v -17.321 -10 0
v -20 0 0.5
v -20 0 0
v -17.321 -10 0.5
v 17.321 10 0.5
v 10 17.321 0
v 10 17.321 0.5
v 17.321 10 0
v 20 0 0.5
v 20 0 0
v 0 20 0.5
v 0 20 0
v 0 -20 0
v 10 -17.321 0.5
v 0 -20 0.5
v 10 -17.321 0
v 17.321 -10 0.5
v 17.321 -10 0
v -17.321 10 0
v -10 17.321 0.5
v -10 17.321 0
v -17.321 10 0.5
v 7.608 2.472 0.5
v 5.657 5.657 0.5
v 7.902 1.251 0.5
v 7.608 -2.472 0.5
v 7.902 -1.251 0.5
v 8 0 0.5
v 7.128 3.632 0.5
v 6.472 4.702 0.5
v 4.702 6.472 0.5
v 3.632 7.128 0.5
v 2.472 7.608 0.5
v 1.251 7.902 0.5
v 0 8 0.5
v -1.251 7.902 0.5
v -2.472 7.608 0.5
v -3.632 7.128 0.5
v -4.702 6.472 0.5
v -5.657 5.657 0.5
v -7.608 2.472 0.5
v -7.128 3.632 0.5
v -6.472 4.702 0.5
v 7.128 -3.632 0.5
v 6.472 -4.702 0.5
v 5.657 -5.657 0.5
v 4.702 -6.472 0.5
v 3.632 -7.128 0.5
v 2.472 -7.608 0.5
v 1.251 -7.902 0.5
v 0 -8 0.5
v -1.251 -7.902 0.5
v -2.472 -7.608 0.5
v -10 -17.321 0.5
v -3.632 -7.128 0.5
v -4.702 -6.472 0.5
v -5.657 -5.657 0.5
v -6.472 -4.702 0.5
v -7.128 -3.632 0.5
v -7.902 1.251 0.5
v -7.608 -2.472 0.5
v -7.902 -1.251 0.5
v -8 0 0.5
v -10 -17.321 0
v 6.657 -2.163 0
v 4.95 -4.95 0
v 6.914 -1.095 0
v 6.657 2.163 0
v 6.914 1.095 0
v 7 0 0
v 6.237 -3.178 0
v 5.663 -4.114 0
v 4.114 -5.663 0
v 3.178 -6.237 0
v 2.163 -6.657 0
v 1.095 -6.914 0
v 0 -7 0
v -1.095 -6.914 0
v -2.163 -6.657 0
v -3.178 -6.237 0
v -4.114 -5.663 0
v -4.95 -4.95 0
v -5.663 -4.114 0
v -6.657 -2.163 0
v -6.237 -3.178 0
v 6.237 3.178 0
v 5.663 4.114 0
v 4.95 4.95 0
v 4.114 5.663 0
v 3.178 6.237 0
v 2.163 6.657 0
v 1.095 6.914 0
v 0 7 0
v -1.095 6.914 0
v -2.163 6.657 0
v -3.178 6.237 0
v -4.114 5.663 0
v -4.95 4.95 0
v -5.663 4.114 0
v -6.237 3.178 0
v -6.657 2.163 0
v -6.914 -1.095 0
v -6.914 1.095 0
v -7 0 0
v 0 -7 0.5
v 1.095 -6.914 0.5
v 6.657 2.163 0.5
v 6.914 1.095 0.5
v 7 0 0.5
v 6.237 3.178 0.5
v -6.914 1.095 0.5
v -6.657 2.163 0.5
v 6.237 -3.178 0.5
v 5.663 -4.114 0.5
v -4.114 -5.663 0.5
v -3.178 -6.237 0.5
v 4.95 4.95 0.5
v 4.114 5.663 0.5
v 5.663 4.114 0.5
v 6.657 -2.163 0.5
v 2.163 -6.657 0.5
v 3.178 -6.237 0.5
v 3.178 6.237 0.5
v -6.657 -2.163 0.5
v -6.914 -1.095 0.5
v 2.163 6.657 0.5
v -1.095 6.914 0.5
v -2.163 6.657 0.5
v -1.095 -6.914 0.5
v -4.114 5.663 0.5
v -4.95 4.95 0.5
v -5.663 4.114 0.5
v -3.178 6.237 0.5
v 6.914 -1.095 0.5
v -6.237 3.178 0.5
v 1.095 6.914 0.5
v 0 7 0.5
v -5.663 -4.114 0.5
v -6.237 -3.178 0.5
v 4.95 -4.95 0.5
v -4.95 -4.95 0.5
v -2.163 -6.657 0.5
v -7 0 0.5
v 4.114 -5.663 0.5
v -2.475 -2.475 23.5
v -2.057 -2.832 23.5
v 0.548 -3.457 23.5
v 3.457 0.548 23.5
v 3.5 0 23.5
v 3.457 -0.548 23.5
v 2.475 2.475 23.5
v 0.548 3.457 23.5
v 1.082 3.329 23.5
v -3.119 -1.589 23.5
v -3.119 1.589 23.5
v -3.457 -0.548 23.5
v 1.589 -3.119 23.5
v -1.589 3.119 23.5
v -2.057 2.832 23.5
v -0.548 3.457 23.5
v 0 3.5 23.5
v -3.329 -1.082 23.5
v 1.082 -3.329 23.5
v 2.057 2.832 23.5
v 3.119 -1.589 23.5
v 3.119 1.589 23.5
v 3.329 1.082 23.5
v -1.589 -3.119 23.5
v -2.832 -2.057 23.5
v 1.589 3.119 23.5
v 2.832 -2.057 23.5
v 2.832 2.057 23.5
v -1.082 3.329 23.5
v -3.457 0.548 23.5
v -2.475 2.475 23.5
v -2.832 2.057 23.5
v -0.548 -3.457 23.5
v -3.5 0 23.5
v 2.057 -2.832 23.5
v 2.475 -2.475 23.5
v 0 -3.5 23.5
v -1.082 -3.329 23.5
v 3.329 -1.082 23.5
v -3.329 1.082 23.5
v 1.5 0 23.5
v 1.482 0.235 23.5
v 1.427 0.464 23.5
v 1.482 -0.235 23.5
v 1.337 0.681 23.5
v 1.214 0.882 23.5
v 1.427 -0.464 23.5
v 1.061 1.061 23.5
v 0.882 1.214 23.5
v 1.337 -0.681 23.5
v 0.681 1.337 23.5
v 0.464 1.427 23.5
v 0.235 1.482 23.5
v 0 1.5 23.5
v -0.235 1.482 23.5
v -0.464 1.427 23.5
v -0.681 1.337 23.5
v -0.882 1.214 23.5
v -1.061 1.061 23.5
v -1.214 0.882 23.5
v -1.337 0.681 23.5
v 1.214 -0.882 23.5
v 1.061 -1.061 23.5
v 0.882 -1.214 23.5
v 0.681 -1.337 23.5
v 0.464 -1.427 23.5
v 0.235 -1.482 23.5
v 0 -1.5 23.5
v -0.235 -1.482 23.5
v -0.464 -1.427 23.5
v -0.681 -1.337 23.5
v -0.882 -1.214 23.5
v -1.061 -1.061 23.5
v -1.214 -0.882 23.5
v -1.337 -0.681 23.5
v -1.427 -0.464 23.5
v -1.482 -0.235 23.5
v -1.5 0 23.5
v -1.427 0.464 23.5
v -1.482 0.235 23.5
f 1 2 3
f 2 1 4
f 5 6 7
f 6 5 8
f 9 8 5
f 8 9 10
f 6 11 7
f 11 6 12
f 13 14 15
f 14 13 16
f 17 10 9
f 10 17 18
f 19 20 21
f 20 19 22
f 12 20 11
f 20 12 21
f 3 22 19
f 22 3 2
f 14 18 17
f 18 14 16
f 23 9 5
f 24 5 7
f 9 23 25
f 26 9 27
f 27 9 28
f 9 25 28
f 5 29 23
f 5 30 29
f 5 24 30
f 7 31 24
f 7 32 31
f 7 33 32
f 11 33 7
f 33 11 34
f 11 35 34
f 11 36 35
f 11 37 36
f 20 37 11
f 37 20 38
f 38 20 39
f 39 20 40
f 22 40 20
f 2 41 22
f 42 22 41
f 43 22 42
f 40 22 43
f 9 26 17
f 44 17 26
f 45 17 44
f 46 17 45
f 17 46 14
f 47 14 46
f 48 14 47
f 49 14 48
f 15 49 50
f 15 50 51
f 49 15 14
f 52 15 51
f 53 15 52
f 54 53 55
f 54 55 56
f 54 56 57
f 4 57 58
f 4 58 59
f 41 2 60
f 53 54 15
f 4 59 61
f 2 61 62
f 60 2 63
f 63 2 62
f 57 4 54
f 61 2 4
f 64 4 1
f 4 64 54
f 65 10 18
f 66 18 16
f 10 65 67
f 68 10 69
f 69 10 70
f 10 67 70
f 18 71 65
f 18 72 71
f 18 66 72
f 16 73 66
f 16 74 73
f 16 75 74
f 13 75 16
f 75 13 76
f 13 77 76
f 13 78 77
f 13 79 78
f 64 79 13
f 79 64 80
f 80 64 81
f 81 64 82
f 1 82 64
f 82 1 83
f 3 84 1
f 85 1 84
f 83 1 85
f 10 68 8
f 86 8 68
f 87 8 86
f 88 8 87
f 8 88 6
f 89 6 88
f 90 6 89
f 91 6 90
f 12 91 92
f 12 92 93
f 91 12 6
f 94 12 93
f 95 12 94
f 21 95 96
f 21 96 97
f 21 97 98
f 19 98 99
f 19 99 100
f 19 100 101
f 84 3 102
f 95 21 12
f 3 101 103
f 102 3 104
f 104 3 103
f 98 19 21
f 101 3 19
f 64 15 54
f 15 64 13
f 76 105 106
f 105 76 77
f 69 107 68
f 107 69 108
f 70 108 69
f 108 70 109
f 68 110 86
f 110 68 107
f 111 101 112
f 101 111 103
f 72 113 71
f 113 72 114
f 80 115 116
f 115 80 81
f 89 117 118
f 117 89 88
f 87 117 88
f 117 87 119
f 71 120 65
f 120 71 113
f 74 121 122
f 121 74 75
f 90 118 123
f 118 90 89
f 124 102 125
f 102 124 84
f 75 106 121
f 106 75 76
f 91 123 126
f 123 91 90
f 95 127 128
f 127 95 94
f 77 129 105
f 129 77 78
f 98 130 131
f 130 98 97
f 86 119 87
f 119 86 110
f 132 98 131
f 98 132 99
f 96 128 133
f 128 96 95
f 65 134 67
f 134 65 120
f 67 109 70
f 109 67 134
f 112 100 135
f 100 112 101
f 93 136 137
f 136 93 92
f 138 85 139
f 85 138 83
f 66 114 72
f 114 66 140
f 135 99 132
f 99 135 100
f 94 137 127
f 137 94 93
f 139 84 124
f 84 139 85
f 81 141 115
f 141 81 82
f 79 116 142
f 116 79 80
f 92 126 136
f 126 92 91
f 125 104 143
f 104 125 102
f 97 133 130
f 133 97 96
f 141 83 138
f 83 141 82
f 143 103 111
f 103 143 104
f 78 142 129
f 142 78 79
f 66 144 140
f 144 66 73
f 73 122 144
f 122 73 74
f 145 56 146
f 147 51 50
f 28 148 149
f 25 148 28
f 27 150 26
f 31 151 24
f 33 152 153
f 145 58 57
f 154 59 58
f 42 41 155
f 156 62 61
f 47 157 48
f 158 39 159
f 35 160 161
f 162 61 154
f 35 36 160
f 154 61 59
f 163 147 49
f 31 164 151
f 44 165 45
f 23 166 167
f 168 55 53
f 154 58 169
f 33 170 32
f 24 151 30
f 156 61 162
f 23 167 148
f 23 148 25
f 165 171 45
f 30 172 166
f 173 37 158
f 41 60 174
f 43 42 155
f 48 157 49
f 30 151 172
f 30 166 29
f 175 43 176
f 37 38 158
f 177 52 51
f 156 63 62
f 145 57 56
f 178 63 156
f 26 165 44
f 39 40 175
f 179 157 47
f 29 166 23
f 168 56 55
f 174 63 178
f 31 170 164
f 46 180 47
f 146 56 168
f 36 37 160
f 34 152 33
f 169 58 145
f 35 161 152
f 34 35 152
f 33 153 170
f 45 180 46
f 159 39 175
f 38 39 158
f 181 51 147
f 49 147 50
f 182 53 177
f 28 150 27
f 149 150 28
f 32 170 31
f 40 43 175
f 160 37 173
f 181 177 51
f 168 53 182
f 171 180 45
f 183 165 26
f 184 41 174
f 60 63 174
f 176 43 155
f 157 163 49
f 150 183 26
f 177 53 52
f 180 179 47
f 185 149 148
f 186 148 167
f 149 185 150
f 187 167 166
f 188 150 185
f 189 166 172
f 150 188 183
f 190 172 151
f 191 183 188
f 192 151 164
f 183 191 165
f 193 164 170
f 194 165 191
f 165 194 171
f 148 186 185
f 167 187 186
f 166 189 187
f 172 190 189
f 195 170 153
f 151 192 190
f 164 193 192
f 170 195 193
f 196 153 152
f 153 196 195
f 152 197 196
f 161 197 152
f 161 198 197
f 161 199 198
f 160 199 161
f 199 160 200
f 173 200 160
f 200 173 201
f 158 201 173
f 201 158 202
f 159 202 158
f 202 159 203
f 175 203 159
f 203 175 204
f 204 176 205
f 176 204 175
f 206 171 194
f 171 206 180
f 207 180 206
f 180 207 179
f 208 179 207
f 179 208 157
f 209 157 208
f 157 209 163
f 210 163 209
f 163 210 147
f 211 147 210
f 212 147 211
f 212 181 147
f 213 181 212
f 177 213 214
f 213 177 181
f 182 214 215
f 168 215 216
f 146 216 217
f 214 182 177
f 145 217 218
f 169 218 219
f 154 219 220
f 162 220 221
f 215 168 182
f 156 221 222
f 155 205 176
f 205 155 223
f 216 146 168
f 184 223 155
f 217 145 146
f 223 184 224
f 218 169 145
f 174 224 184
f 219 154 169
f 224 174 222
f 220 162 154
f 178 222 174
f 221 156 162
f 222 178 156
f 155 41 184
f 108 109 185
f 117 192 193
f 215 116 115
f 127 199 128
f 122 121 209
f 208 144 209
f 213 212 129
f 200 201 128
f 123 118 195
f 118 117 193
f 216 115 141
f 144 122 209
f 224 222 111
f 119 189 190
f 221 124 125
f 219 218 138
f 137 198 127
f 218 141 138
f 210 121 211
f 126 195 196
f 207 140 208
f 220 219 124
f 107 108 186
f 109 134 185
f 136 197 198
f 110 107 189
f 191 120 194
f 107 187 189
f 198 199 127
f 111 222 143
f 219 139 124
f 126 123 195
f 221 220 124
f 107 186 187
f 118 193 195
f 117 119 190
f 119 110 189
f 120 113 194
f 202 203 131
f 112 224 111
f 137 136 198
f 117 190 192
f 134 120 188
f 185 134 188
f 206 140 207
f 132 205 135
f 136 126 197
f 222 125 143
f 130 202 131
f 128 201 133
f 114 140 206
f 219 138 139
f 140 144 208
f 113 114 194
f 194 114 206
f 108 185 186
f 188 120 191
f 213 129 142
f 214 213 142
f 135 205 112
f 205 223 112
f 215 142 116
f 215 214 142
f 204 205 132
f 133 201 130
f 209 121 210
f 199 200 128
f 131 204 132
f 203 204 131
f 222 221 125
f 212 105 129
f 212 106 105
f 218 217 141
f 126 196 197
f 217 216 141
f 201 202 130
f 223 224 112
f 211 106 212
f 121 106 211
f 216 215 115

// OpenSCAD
$fn = 100;

//Main parameters to tune : Configured for MatterControl
$Rail6mmDiameter = 6.2;//Hole for X 6mm rail attachments to Y carriages and Y rails to base supports - Good
$LeadScrewAttachHoleDiameter = 16.3;//Leadscrew block hole for T-threads
$VerticalLockClearance = .4;//Delta between vertical threaded hole and free hole
$HorizontalLockClearance = .35;//Delta between horizontal threaded hole and free hole
$LockScrewBoreM2_5Vertical = 2.4;//3D printed vertical hole for M2.5 threadlock - Good
$LockScrewBoreM2_5Horizontal = 2.3;//3D printed horizontal hole for M2.5 threadlock
$LockScrewBoreM3Vertical = 3.0;
$LockScrewBoreM3_5Vertical = 3.4;
$LockScrewBoreM3Horizontal = 2.85;
$LockScrewBoreM8Vertical = 7.8;//Vertical M8 threadlocked hole - Good
$Shaft3mmHorizontal = 3.05;
$Bearing8mmDiameter = 22.2;
$LockScrewBoreM2_5Laser = 2.2;//Laser mounting holes for leadscrew block and limit switches
$LockScrewBoreM3Laser = 2.7;
$LockScrewBoreM2Laser = 1.7;//Laser hole size for M2 thread locking
$Bearing6mmDiameter = 12.2;
$XMotorMountSpacing = 11.5;
$BearingShaftDiameter = 8.1;
$XMotorMountExtension = 4; // Extend the X motor Y plate mounting hole lengths to accomodate different motors

$HeightAdjust = 19;//Allow adjustment for overall carriage height for 808T focus requierments. 19 is good since it aligns with original y plate holes to allow dual fitting
$DoTall = 0;

$PlateClearance = .15;

$AcrylicThickness = 3.0;
$BaseAcrylicThickness = 10;
$AlignmentAcrylicThickness = 1.5;


$BaseAcrylicColor = [0.1, 0.5, 0.0, 0.9];
$FrameAcrylicColor = [0.7, 0.8, 0.2, 0.9];
$AlignmentAcrylicColor = [0.3, 0.7, 0.7, 0.4];
$BaseAcrylicColor = [0.1, 0.1, 0.5, 0.6];

$YPosition = 130;
$XPosition = 150;

$RoundToHex = 1.155;

$XRailSpacing = 300;
$CarrierSpacing = 40;
$CarrierZOffset = 14;
$LaserCarrierWidth = 58;
$LaserCarrierLength = 68;
$XRailLength = 300;
$YRailLength = 270;

module RodClamp()
{
  //width = width of main block
  //height = height of main block
  //depth = depth of main block
  //boreheight = height of center of shaft from base
  //boreradius = radius of bore
  //gapwidth = width of clamp gap
  //screwbore = bore hole radius for clamp screw
  //screwstyle = 0-hex side aligned, 1-hex top aligned, 2-round
  //captivestyle = 0-hex side aligned, 1-hex top aligned, 2-square open to top, 3-hex base open top
  //captivebore = bore hole radius of captive nut
  //captivedepth = thicknes of captuve nut
  //screwoffset = height of clamp screw hole delta from centered

  upper = (height - boreheight - boreradius);

//    screwoffset = (upper / 2) + boreradius;
    screwheight = (upper / 2) + boreradius + screwoffset;

  difference()
  {
    translate([-width/2, -depth/2, -boreheight])
      cube([width, depth, height]);
    rotate(90, [1, 0, 0])
      cylinder(r = boreradius, h = depth + 0.1, center = true);
    translate([0, -(depth + 0.1) / 2, 0])
      rotate(-45, [0, 1, 0])
      cube([boreradius, depth + 0.1, boreradius]);
    translate([-gapwidth / 2, -(depth + 0.1) / 2, 0])
    cube([gapwidth, depth + 0.1, height - boreheight + 0.1]);

    translate([0, 0, screwheight])
    {
      rotate(90, [0, 1, 0])
        if (screwstyle == 0)
          cylinder(r = screwbore, h = width + 0.1, center = true, $fn = 6);
        else if (screwstyle == 1)
          rotate(30, [0, 0, 1])
          cylinder(r = screwbore / 0.866025, h = width + 0.1, center = true, $fn = 6);
        else if (screwstyle == 2)
          cylinder(r = screwbore / 0.866025, h = width + 0.1, center = true);
      translate([((width - captivedepth) / 2) + 0.1, 0, 0])
      {
      if (captivestyle == 0)
        rotate(90, [0, 1, 0])
          cylinder(r = captivebore / 0.866025, h = captivedepth + 0.1, center = true, $fn = 6);
      else if (captivestyle == 1)
        rotate(90, [0, 1, 0])
          rotate(30, [0, 0, 1])
            cylinder(r = captivebore / 0.866025, h = captivedepth + 0.1, center = true, $fn = 6);
      else if (captivestyle == 2)
        translate([0, 0, ((upper + (captivebore * 2)) / 4) - ((captivebore * 2)/ 1.8)])
        cube([captivedepth + 0.1, captivebore * 2, ((upper + (captivebore * 2)) / 1.8)], center = true);
      else if (captivestyle == 3)
      {
        translate([0, 0, ((upper + captivebore) / 4)])
        cube([captivedepth + 0.1, captivebore * 2, ((upper + captivebore) / 1.7)], center = true);
        rotate(90, [0, 1, 0])
          cylinder(r = captivebore / 0.866025, h = captivedepth + 0.1, center = true, $fn = 6);
      }
      }
    }
  }
}

module LaserCarrier()
{
  translate([-31, -38.5, -7])
  difference()
  {
    //Base mount
    cube([$LaserCarrierWidth, $LaserCarrierLength, 21]);
    //Mechanism opening
    translate([4, 4, -0.1])
      cube([$LaserCarrierWidth - 8, 68 - 8, 21.2]);
//    //FPC opening, horizontal
//    translate([-1, 23.5, -0.1])
//      cube([20, 30, 5]);
    //Rail support 1
    translate([-0.1, 11, 3])
      rotate(90, [0, 1, 0])
        rotate(30, [0, 0, 1])
          cylinder(d = $Shaft3mmHorizontal * $RoundToHex, h = 70, $fn = 6);
    //Rail support 2
    translate([-0.1, 11 + 48, 3])
      rotate(90, [0, 1, 0])
        rotate(30, [0, 0, 1])
          cylinder(d = $Shaft3mmHorizontal * $RoundToHex, h = 70, $fn = 6);
  }
}

module SideRailClamp()
{
  difference()
  {
	translate([0, 0, ($HeightAdjust * $DoTall)])
    rotate(90, [0, 0, 1])
      RodClamp(width = 15, height = 21 + ($HeightAdjust * $DoTall), screwoffset = 0, depth = 18, boreheight = 6 + ($HeightAdjust * $DoTall), boreradius = ($Rail6mmDiameter / 2), gapwidth = 0, screwbore = 0, screwstyle = 0, captivestyle = 0, captivebore = 0, captivedepth = 0);
	translate([0, 0, ($HeightAdjust * $DoTall)])
	{
    //Rail clamp hole
    translate([0, 10, 0])
      rotate(90, [1, 0, 0])
        cylinder(d = $LockScrewBoreM2_5Horizontal, h = 20);
//    //Thread locked section
//    cylinder(d = $LockScrewBoreM2_5Vertical, h = 25);
//    //Screw head countersink section
//    translate([0, 0, 7])
//      cylinder(d = 6.3, h = 25);
    //Top plate mounting holes
    translate([0, 5, -5])
      cylinder(d = $LockScrewBoreM2_5Vertical, h = 25);
    translate([0, -5, -5])
      cylinder(d = $LockScrewBoreM2_5Vertical, h = 25);
	}
  }
}

module SideRailCarriage()
{
  //Lower side rail rider for bearing
  difference()
  {
    RodClamp(width = 18, height = 18, screwoffset = 0, depth = 55, boreheight = 10, boreradius = ($Bearing6mmDiameter / 2), gapwidth = 0, screwbore = 0, screwstyle = 0, captivestyle = 0, captivebore = 0, captivedepth = 1.5);
    //Lock screw hole
    translate([-15, 0, 0])
      rotate(90, [0, 1, 0])
        cylinder(d = $LockScrewBoreM2_5Horizontal, h = 30);
  }
  translate([0, -$CarrierSpacing / 2, $CarrierZOffset])
    SideRailClamp();
  difference()
  {
    translate([0, $CarrierSpacing / 2, $CarrierZOffset])
      SideRailClamp();
    translate([0, 27.5, 28 + $HeightAdjust])
      rotate(90, [0, 1, 0])
        rotate(-90, [1, 0, 0])
          LimitSwitchHoles();
  }
}

module BeltClampHolePairVertical()
{
  translate([0, 0, -7])
    rotate(-90, [0, 1, 0])
      cylinder(d = $Bore, h = 20);
  translate([0, 0, 8])
    rotate(-90, [0, 1, 0])
      cylinder(d = $Bore, h = 20);
}

module XCarriageFixedDiode()
{
  difference()
  {
    union()
    {
      translate([-7, $CarrierSpacing / 2, $CarrierZOffset])
        rotate(90, [0, 0, 1])
          difference()
          {
            RodClamp(width = 18, height = 25, screwoffset = 0, depth = 50, boreheight = 14, boreradius = ($Bearing6mmDiameter / 2), gapwidth = 0, screwbore = 0, screwstyle = 0, captivestyle = 0, captivebore = 0, captivedepth = 1.5);
            //Belt clamp holes
            translate([-1.8, 21, 0])
              BeltClampHolePairVertical($Bore = $LockScrewBoreM2_5Horizontal);
            translate([-1.8, -21, 0])
              BeltClampHolePairVertical($Bore = $LockScrewBoreM2_5Horizontal);
           }
      translate([-7, -$CarrierSpacing / 2, $CarrierZOffset - 0])
      {
        rotate(90, [0, 0, 1])
          RodClamp(width = 18, height = 23, screwoffset = 0, depth = 40, boreheight = 14, boreradius = ($Bearing6mmDiameter / 2), gapwidth = 0, screwbore = 0, screwstyle = 0, captivestyle = 0, captivebore = 0, captivedepth = 1.5);
      }

      //Limit switch bumper
      translate([16, 26.5, 0])
        cube([17, 6, 25]);

      //Diode mounting block and runner support
      translate([-22, -12, 0])
      cube([30, 24, 12]);
    }
    
    //Bearing lock screw holes
    translate([0, 34, 14])
      rotate(90, [1, 0, 0])
        cylinder(d = $LockScrewBoreM2_5Horizontal, h = 10);
    translate([0, -24, 14])
      rotate(90, [1, 0, 0])
        cylinder(d = $LockScrewBoreM2_5Horizontal, h = 10);

	//Diode mounting hole
      translate([-7, 6, -0.01])
	cylinder(d1 = 12.25, d2 = 12.0, h = 30);
        
  }
}



module XCarriage()
{
  difference()
  {
    union()
    {
      translate([-7, $CarrierSpacing / 2, $CarrierZOffset])
        rotate(90, [0, 0, 1])
          difference()
          {
            RodClamp(width = 18, height = 25, screwoffset = 0, depth = $LaserCarrierLength, boreheight = 14, boreradius = ($Bearing6mmDiameter / 2), gapwidth = 0, screwbore = 0, screwstyle = 0, captivestyle = 0, captivebore = 0, captivedepth = 1.5);
            //Belt clamp holes
            translate([0, 23, 0])
              BeltClampHolePairVertical($Bore = $LockScrewBoreM2_5Horizontal);
            translate([0, -15, 0])
              BeltClampHolePairVertical($Bore = $LockScrewBoreM2_5Horizontal);
           }
      translate([-7, -$CarrierSpacing / 2, $CarrierZOffset - 0])
      {
        rotate(90, [0, 0, 1])
          RodClamp(width = 18, height = 23, screwoffset = 0, depth = $LaserCarrierLength, boreheight = 14, boreradius = ($Bearing6mmDiameter / 2), gapwidth = 0, screwbore = 0, screwstyle = 0, captivestyle = 0, captivebore = 0, captivedepth = 1.5);
      }

      //Laser carrier
      translate([-11.5,2, -10])
        rotate(90, [0, 0, 1])
          LaserCarrier();

      //Limit switch bumper
      translate([23, 26.5, -17])
        cube([4, 6, 42]);
    }
    //FPC opening, vertical
    translate([-($LaserCarrierLength / 2) - 10, -12, -2])
      cube([$LaserCarrierLength + 10, 24, 40]);
    
    //Bearing lock screw holes
    translate([-10, 20, 20])
      cylinder(d = $LockScrewBoreM3Vertical, h = 10, $fn = 30);
    translate([0, -24, 14])
      rotate(90, [1, 0, 0])
        cylinder(d = $LockScrewBoreM3Vertical * $RoundToHex, h = 10, $fn = 6);

    //Belt clamp access holes
    //Lower
//    translate([-22, 8, 7])
//      rotate(95, [1, 0, 0])
//        cylinder(d = 6, h = 55, $fn = 6);
    translate([8, 8, 7])
      rotate(95, [1, 0, 0])
        cylinder(d = 6, h = 55, $fn = 6);
    //Upper
//    translate([-22, 8, 22])
//      rotate(81.5, [1, 0, 0])
//        cylinder(d = 6, h = 55, $fn = 6);

//    translate([8, 8, 22])
//      rotate(81.5, [1, 0, 0])
//        cylinder(d = 6, h = 55, $fn = 6);

    translate([8, -15, 22.1])
      cube([6, 40, 6], center = true);
//      rotate(90, [1, 0, 0])
//#        cylinder(d = 6, h = 55, $fn = 6);
        
    //Clearance for motor pulley
    translate([13, 10, 7.9])
      cube([15, 16.1, 27]);
    //Clearance for belt 
    translate([-48, -32, 3.9])
      cube([30, 26.1, 27]);
  }
}

module YRailClampTall()
{
  translate([0,0, 20])
  difference()
  {
    RodClamp(width = 18, height = 56, screwoffset = 2, depth = 10, boreheight = 46, boreradius = ($Rail6mmDiameter / 2), gapwidth = 0, screwbore = 0, screwstyle = 1, captivestyle = 1, captivebore =0, captivedepth = 1.5);
    //Spacer/Y drive shaft bearing plate holes
    translate([5, 10, 7])
      rotate(90, [1, 0, 0])
        cylinder(d = ($LockScrewBoreM3Horizontal + $HorizontalLockClearance) * $RoundToHex, h = 20, $fn = 6);
    translate([-5, 10, 7])
      rotate(90, [1, 0, 0])
        cylinder(d = ($LockScrewBoreM3Horizontal + $HorizontalLockClearance) * $RoundToHex, h = 20, $fn = 6);
    translate([5, 10, -12])
      rotate(90, [1, 0, 0])
        cylinder(d = ($LockScrewBoreM3Horizontal + $HorizontalLockClearance) * $RoundToHex, h = 20, $fn = 6);
    translate([-5, 10, -12])
      rotate(90, [1, 0, 0])
        cylinder(d = ($LockScrewBoreM3Horizontal + $HorizontalLockClearance)  * $RoundToHex, h = 20, $fn = 6);
    //Top mounting lock screw hole
    cylinder(d = $LockScrewBoreM2_5Vertical, h = 20);
  }
  //Mounting base
  translate([-(32 / 2), -5, -26])
  {
    difference()
    {
      cube([32, 10, 10]);
      translate([3, 5, -1])
        cylinder(d = $LockScrewBoreM3Vertical + $VerticalLockClearance, h = 20);
      translate([32 - 3, 5, -1])
        cylinder(d = $LockScrewBoreM3Vertical + $VerticalLockClearance, h = 20);
    }
  }
}

module YRailClamp()
{
  difference()
  {
    union()
    {
      RodClamp(width = 18, height = 37, screwoffset = 2, depth = 10, boreheight = 26, boreradius = ($Rail6mmDiameter / 2), gapwidth = 0, screwbore = 0, screwstyle = 1, captivestyle = 1, captivebore =0, captivedepth = 1.5);
      translate([0, 0, $HeightAdjust])
        RodClamp(width = 18, height = $HeightAdjust + 1, screwoffset = 2, depth = 10, boreheight = $HeightAdjust - 10, boreradius = ($Rail6mmDiameter / 2), gapwidth = 0, screwbore = 0, screwstyle = 1, captivestyle = 1, captivebore =0, captivedepth = 1.5);
    }
	translate([0, 0, $HeightAdjust])
	{
	    //Spacer/Y drive shaft bearing plate holes
	    translate([5, 10, 7])
	      rotate(90, [1, 0, 0])
	        cylinder(d = ($LockScrewBoreM3Horizontal + $HorizontalLockClearance) * $RoundToHex, h = 20, $fn = 6);
	    translate([-5, 10, 7])
	      rotate(90, [1, 0, 0])
	        cylinder(d = ($LockScrewBoreM3Horizontal + $HorizontalLockClearance) * $RoundToHex, h = 20, $fn = 6);
	    translate([5, 10, -12])
	      rotate(90, [1, 0, 0])
	        cylinder(d = ($LockScrewBoreM3Horizontal + $HorizontalLockClearance) * $RoundToHex, h = 20, $fn = 6);
	    translate([-5, 10, -12])
	      rotate(90, [1, 0, 0])
	        cylinder(d = ($LockScrewBoreM3Horizontal + $HorizontalLockClearance)  * $RoundToHex, h = 20, $fn = 6);
	    translate([5, 10, -31])
	      rotate(90, [1, 0, 0])
	        cylinder(d = ($LockScrewBoreM3Horizontal + $HorizontalLockClearance) * $RoundToHex, h = 20, $fn = 6);
	    translate([-5, 10, -31])
	      rotate(90, [1, 0, 0])
	        cylinder(d = ($LockScrewBoreM3Horizontal + $HorizontalLockClearance)  * $RoundToHex, h = 20, $fn = 6);
	}
  
  //Lock screw holes
	translate([-20, 0, 0])
    rotate(90, [0, 1, 0])
      cylinder(d = $LockScrewBoreM2_5Vertical, h = 40);
	translate([-20, 0, $HeightAdjust])
    rotate(90, [0, 1, 0])
      cylinder(d = $LockScrewBoreM2_5Vertical, h = 40);
  }
  //Mounting base
  translate([-(32 / 2), -5, -26])
  {
    difference()
    {
      cube([32, 10, 10]);
      translate([3, 5, -1])
        cylinder(d = $LockScrewBoreM3Vertical + $VerticalLockClearance, h = 20);
      translate([32 - 3, 5, -1])
        cylinder(d = $LockScrewBoreM3Vertical + $VerticalLockClearance, h = 20);
    }
  }
}

/*
module PlateHoleSet()
{
  translate([4, 20, 4])
    rotate(90, [1, 0, 0])
      cylinder(d = $LockScrewBoreM3Laser + $PlateClearance, h = 30);
  translate([14, 20, 4])
    rotate(90, [1, 0, 0])
      cylinder(d = $LockScrewBoreM3Laser + $PlateClearance, h = 30);
  translate([4, 20, 23])
    rotate(90, [1, 0, 0])
      cylinder(d = $LockScrewBoreM3Laser + $PlateClearance, h = 30);
  translate([14, 20, 23])
    rotate(90, [1, 0, 0])
      cylinder(d = $LockScrewBoreM3Laser + $PlateClearance, h = 30);
  translate([9, 20, 16])
    rotate(90, [1, 0, 0])
      cylinder(d = 6.5, h = 30);
}
*/

module PlateHoleSet()
{
  translate([4, 4])
      circle(d = $LockScrewBoreM3Laser + $PlateClearance);
  translate([14, 4])
      circle(d = $LockScrewBoreM3Laser + $PlateClearance);
  translate([4, 23])
      circle(d = $LockScrewBoreM3Laser + $PlateClearance);
  translate([14, 23])
      circle(d = $LockScrewBoreM3Laser + $PlateClearance);
  translate([9, 16])
      circle(d = 6.5, h = 30);
}

/*
module YPlateMotorHoles()
{
  translate([15.5, 0, 15.5])
    rotate(90, [1, 0, 0])
      cylinder(d = $MountBore, h = 15);
  translate([-15.5, 0, 15.5])
    rotate(90, [1, 0, 0])
      cylinder(d = $MountBore, h = 15);
  translate([15.5, 0, -15.5])
    rotate(90, [1, 0, 0])
      cylinder(d = $MountBore, h = 15);
  translate([-15.5, 0, -15.5])
    rotate(90, [1, 0, 0])
      cylinder(d = $MountBore, h = 15);
}
*/

module YPlateMotorHoles2D()
{
  translate([15.5, 15.5])
      circle(d = $MountBore);
  translate([-15.5, 15.5])
      circle(d = $MountBore);
  translate([15.5, -15.5])
      circle(d = $MountBore);
  translate([-15.5, -15.5])
      circle(d = $MountBore);
}

module YPlateMotorHoles()
{
  rotate(90, [1, 0, 0])
    linear_extrude(height = 15, center = false, convexity = 10, twist = 0)
      YPlateMotorHoles2D();
}

module YPlate2D()
{
  translate([-9, -16])
  {
    intersection()
    {
      difference()
      {
        square([$XRailLength + 18, 86]);
        //Left mounting holes
        PlateHoleSet();
        translate([$XRailLength, 0, 0])
          PlateHoleSet();
        //Lower arch
        translate([($XRailLength / 2) + 9, (-700 / 2) + 30])
            circle(d = 700);
        //Y shaft bearing mounting
        translate([($XRailLength / 2) + 9, 57])
        {
          //Shaft opening
            circle(d = $ShaftDiameter);
          //Mounting screw holes
          YPlateMotorHoles2d($MountBore = $LockScrewBoreM3Laser + $PlateClearance);
        }
      }
      //Upper arch
      translate([($XRailLength / 2) + 9, (-550 / 2) + 78])
          circle(d = 550, h = 15);//, $fn = 200);
    }
  }
}

module YPlate()
{
  color($FrameAcrylicColor)
    linear_extrude(height = $AcrylicThickness, center = false, convexity = 10, twist = 0)
    {
      YPlate2D($ShaftDiameter = $ShaftDiameter);
    }
}

module YMotorMount()
{
  translate([21, -2, 21])
  {
    LeadScrewBearingBlock($Depth = 4);
    translate([0, -18, 0])
    {
      difference()
      {
        LeadScrewBearingBlock($Depth = 4);
        translate([-5, -3, 9])
          cube([10, 6, 15]);
      }
    }
    translate([20, -20, -66.5 - $HeightAdjust])
    difference()
    {
      cube([4, 22, 86.5 + $HeightAdjust]);
      translate([0, 7, 59])
        rotate(90, [0, 1, 0])
          LimitSwitchHoles();
    }
    
    translate([-24, -20, -66.5 - $HeightAdjust])
      cube([4, 22, 86.5 + $HeightAdjust]);
    
    translate([-24, -20, - $HeightAdjust - 66.5])
    difference()
    {
      cube([48, 4, 66.5]);
      translate([30, -1, 37])
        cube([15, 6, 25]);
    }
    //Base plate and mounting holes
    translate([-24, -20, -66.5 - $HeightAdjust])
    difference()
    {
      cube([48, 22, 4]);
      translate([24, 15, -1])
        cylinder(d = $LockScrewBoreM3Vertical + $VerticalLockClearance, h = 200);
      translate([38, 7, -1])
        cylinder(d = $LockScrewBoreM3Vertical + $VerticalLockClearance, h = 200);
      translate([10, 7, -1])
        cylinder(d = $LockScrewBoreM3Vertical + $VerticalLockClearance, h = 200);
    }
  }
}

module YMotorMountOld()
{
  translate([21, -2, 21])
  {
    LeadScrewBearingBlock($Depth = 4);
    translate([0, -18, 0])
    {
      difference()
      {
        LeadScrewBearingBlock($Depth = 4);
        translate([-5, -3, 9])
          cube([10, 6, 15]);
      }
    }
    translate([20, -20, -66.5 - $HeightAdjust])
    difference()
    {
      cube([4, 22, 86.5 + $HeightAdjust]);
      rotate(-23, [1, 0, 0])
        translate([-.1, 2, 0])
          cube([5, 22, 86.5]);
    }
    
    translate([-24, -20, -66.5 - $HeightAdjust])
    difference()
    {
      cube([4, 22, 86.5 + $HeightAdjust]);
      rotate(-23, [1, 0, 0])
        translate([-.1, 2, 0])
          cube([5, 22, 86.5]);
    }
    
  }
}

module YMotor()
{
  color([.2, .2, .2])
    cube([42, 42, 42]);
  color([.6, .6, .6])
    translate([21, 0, 21])
      rotate(90, [1, 0, 0])
        cylinder(d = 22, h = 3);
  color([.7, .7, .7])
    translate([21, 0, 21])
      rotate(90, [1, 0, 0])
        cylinder(d = 5, h = 21);
  color([.7, .7, .7])
    translate([21, -16, 21])
      rotate(90, [1, 0, 0])
        cylinder(d = 19, h = 25);
}

module YCarriagePlateMountHoles()
{
  translate([9, 2.5, -1])
    cylinder(d = $LockScrewBoreM2_5Laser + $PlateClearance, h = 10);
  translate([9, 12.5, -1])
    cylinder(d = $LockScrewBoreM2_5Laser + $PlateClearance, h = 10);
  translate([9, 42.5, -1])
    cylinder(d = $LockScrewBoreM2_5Laser + $PlateClearance, h = 10);
  translate([9, 52.5, -1])
    cylinder(d = $LockScrewBoreM2_5Laser + $PlateClearance, h = 10);
  //Rail fix screw holes
  translate([9, 7.5, -1])
    cylinder(d = 6.3, h = 10);
  translate([9, 47.5, -1])
    cylinder(d = 6.3, h = 10);
}

module YCarriagePlateMountHoles2D()
{
  translate([9, 2.5])
    circle(d = $LockScrewBoreM2_5Laser + $PlateClearance);
  translate([9, 12.5])
    circle(d = $LockScrewBoreM2_5Laser + $PlateClearance);
  translate([9, 42.5])
    circle(d = $LockScrewBoreM2_5Laser + $PlateClearance);
  translate([9, 52.5])
    circle(d = $LockScrewBoreM2_5Laser + $PlateClearance);
//  //Rail fix screw holes
//  translate([9, 7.5])
//    circle(d = 6.3);
//  translate([9, 47.5])
//    circle(d = 6.3);
}

module LimitSwitchHoles2D()
{
  translate([-5, 2.5])
    circle(d = $LockScrewBoreM2_5Laser);
  translate([-15, 2.5])
    circle(d = $LockScrewBoreM2_5Laser);
}

module YCoverPlate2D()
{
  difference()
  {
    //Base plate
  	square([$XRailSpacing + 18, 55]);
    //Y carriage mounting holes
    YCarriagePlateMountHoles2D();
    translate([$XRailSpacing, 0])
      YCarriagePlateMountHoles2D();
    //Motor mount openings
    translate([$XRailSpacing - 10, 32])
    {
    //Alignment collar
    translate([0, 0,0])
      hull()
      {
        translate([-5, 0])
          circle(d = 22);
        circle(d = 22);
      }
    //Mounting holes/screws. Note, longer so we can mount 2 different motor sizes
    translate([$XMotorMountSpacing + $XMotorMountExtension, $XMotorMountSpacing])
      hull()
      {
        translate([-5 - $XMotorMountExtension, 0])
          circle(d = 2.4);
        circle(d = 2.4);
      }
    translate([$XMotorMountSpacing + $XMotorMountExtension, -$XMotorMountSpacing])
      hull()
      {
        translate([-5 - $XMotorMountExtension, 0])
          circle(d = 2.4);
        circle(d = 2.4);
      }
    translate([-$XMotorMountSpacing, $XMotorMountSpacing])
      hull()
      {
        translate([-5 - $XMotorMountExtension, 0])
          circle(d = 2.4);
         circle(d = 2.4);
      }
    translate([-$XMotorMountSpacing, -$XMotorMountSpacing])
      hull()
      {
        translate([-5 - $XMotorMountExtension, 0])
          circle(d = 2.4);
        circle(d = 2.4);
      }
    }
    //Bearing shaft opening for bolt. No longer needed
//    translate([9, 26.5])
//      circle(d = 8);
    //Y rider mounting holes
    translate([(($XRailSpacing  + 18)/ 2) - 10, 5])
      circle(d = $LockScrewBoreM2_5Laser);
    translate([(($XRailSpacing  + 18)/ 2) + 10, 5])
      circle(d = $LockScrewBoreM2_5Laser);
    //Subtract limit switch mount holes
    translate([(($XRailLength  + 18)/ 2) + 40, 47])
//      rotate(180, [0, 1, 0])
        LimitSwitchHoles2D();
    
    //Belt clamp access opening
    translate([40, 16])
      square([26, 26]);
  }
}

module YCoverPlate()
{
  color($FrameAcrylicColor)
  linear_extrude(height = $AcrylicThickness, center = false, convexity = 10, twist = 0)
    YCoverPlate2D();
}

module YCoverPlate3D()
{
  color($FrameAcrylicColor)
  difference()
  {
    //Base plate
  	cube([$XRailLength + 18, 55, $AcrylicThickness]);
    //Y carriage mounting holes
    YCarriagePlateMountHoles();
    translate([$XRailLength, 0, 0])
      YCarriagePlateMountHoles();
    //Motor mount openings
    translate([$XRailLength - 10, 32, 2])
    {
    //Alignment collar
    translate([0, 0, -3])
      hull()
      {
        translate([-5, 0, 0])
          cylinder(d = 22, h = 5);
        cylinder(d = 22, h = 5);
      }
    //Mounting holes/screws
    translate([11.5, 11.5, -5])
      hull()
      {
        translate([-5, 0, 0])
          cylinder(d = 2.4, h = 70);
        cylinder(d = 2.4, h = 70);
      }
    translate([11.5, -11.5, -5])
      hull()
      {
        translate([-5, 0, 0])
          cylinder(d = 2.4, h = 70);
        cylinder(d = 2.4, h = 70);
      }
    translate([-11.5, 11.5, -5])
      hull()
      {
        translate([-5, 0, 0])
          cylinder(d = 2.4, h = 70);
         cylinder(d = 2.4, h = 70);
      }
    translate([-11.5, -11.5, -5])
      hull()
      {
        translate([-5, 0, 0])
          cylinder(d = 2.4, h = 70);
        cylinder(d = 2.4, h = 70);
      }
    }
    translate([9, 26.5, -1])
      cylinder(d = 8, h = 30);
    //Y rider mounting holes
    translate([(($XRailLength  + 18)/ 2) - 10, 5, -1])
      cylinder(d = $LockScrewBoreM2_5Laser + $PlateClearance, h = 30);
    translate([(($XRailLength  + 18)/ 2) + 10, 5, -1])
      cylinder(d = $LockScrewBoreM2_5Laser + $PlateClearance, h = 30);
    //Subtract limit switch mount holes
    translate([(($XRailLength  + 18)/ 2) + 40, 47, 9.46])
      rotate(180, [0, 1, 0])
        LimitSwitchHoles();
  }
}

module XStepper()
{
  //Main body
  color([0.3, 0.3, 0.3])
    translate([-14, -14, 0])
      cube([28, 28, 45]);
  //Shaft
  color([0.8, 0.8, 0.8])
    translate([0, 0, -20])
      cylinder(d = 5, h = 20);
  //Pulley
  translate([0, 0, 2.85 - $AcrylicThickness])
  color([0.8, 0.8, 0.8])
  {
    translate([0, 0, -12])
      cylinder(d = 12.9, h = 6);
    translate([0, 0, -12 - 7])
      cylinder(d = 9.6, h = 7);
    translate([0, 0, -12 - 7 - 1])
      cylinder(d = 12.9, h = 1);
  }
}

module LeadScrewRiderSmall()
{
  translate([0,  - 32.7, 0])
  color([0.8, 0.8, 0.83])
  {
    rotate(-90, [1, 0, 0])
      cylinder(d = 10, h = 15);
    translate([0, 1.6, 0])
      rotate(-90, [1, 0, 0])
      difference()
      {
        cylinder(d = 22, h = 3.6);
        translate([8, 0, -1])
        cylinder(d = 3.5, h = 6);
        translate([-8, 0, -1])
        cylinder(d = 3.5, h = 6);
        translate([0, 8, -1])
        cylinder(d = 3.5, h = 6);
        translate([0, -8, -1])
        cylinder(d = 3.5, h = 6);
      }
  }
}

module LeadScrewRiderLarge()
{
  translate([0,  - 32.7, 0])
  color([0.8, 0.8, 0.83])
  {
    rotate(-90, [1, 0, 0])
      cylinder(d = 15.7, h = 31);
    translate([0, 0, 0])
      rotate(-90, [1, 0, 0])
      difference()
      {
        cylinder(d = 30, h = 5);
        translate([11, 0, -1])
        cylinder(d = 3.5, h = 7);
        translate([-11, 0, -1])
        cylinder(d = 3.5, h = 7);
        translate([0, 11, -1])
        cylinder(d = 3.5, h = 7);
        translate([0, -11, -1])
        cylinder(d = 3.5, h = 7);
      }
  }
}

module LeadScrewRider()
{
  //LeadScrewRiderSmall();
  LeadScrewRiderLarge();
}

module BeltClamp()
{
  translate([-21, 5, 4.5])
  difference()
  {
    translate([0, 0, -1])
    cube([9, 6, 22]);
    translate([4.5, 8,9.5])
      rotate(90, [0, 0, 1])
        BeltClampHolePairVertical($Bore = $LockScrewBoreM2_5Vertical + $VerticalLockClearance + .5);
    translate([-1, 4.1, 8.5])
    cube([18, 2, 7]);
  }
  //Add gripper teeth
  for ($i = [1:4])
  {
    translate([($i * 2) - 21.5, 8, 12.2])
      rotate(45, [0, 0, 1])
        cube([1.5, 1.5, 8]);
  }
}

module RightSideRailCarriage()
{
  SideRailCarriage();
  if ($DoTall == 1)
  {
  translate([0, 0, 15])
    cube([18, 30, 20], center = true);
  }
}


module LeftSideRailCarriage()
{
  difference()
  {
    SideRailCarriage();
    translate([0, 0, ($HeightAdjust * $DoTall)])
    {
      //Bearing cut out
      translate([-10, -15.4, 11])
        cube([20, 3, 10.5]);
      translate([-10, -15.4, 21.4])
        rotate(-35, [1, 0, 0])
          cube([20, 3, 5]);
    }
  }
  translate([-9, -15.4,8])
    cube([18, 29, 4.4 + ($HeightAdjust * $DoTall)]);

  translate([0, 0, ($HeightAdjust * $DoTall)])
  {
  //Bearing lower mount
  translate([0, -1,8])
    cylinder(d1 = $BearingShaftDiameter, d2 = $BearingShaftDiameter, h = 13.5);
  translate([0, -1,21.5])
    cylinder(d1 = $BearingShaftDiameter, d2 = $BearingShaftDiameter - .5, h = 1);
  translate([0, -1,8])
    cylinder(d = $BearingShaftDiameter + 3, h = 4.9);
  }
}

module LeadScrewBlock()
{
  translate([0, -22.5, 2])
  {
    difference()
    {
      translate([0, 0, -3])
        cube([40, 10, 18.3], center = true);
      translate([0, 0, -0.15 - $AcrylicThickness])
      {
      //Y rider opening
      rotate(90, [1, 0, 0])
        cylinder(d = $LeadScrewAttachHoleDiameter, h = 20, center = true);
      //Y rider mounting screw holes
      translate([-11, 0, 0])
        rotate(90, [1, 0, 0])
          cylinder(d = $LockScrewBoreM3_5Vertical, h = 20, center = true);
      translate([11, 0, 0])
        rotate(90, [1, 0, 0])
          cylinder(d = $LockScrewBoreM3_5Vertical, h = 20, center = true);
      }
      //YPlate mounting holes
      translate([-10, 0, -20])
        cylinder(d = ($LockScrewBoreM2_5Horizontal) * $RoundToHex, h = 15, $fn = 6);
      translate([10, 0, -20])
        cylinder(d = ($LockScrewBoreM2_5Horizontal) * $RoundToHex, h = 15, $fn = 6);
    }
  }
}

module LeadScrewBearingBlock()
{
  difference()
  {
    cube([40, $Depth, 40], center = true);
    translate([0, 6, 0])
    {
      YPlateMotorHoles($MountBore = $LockScrewBoreM3Vertical + $HorizontalLockClearance);    
      rotate(90, [1, 0, 0])
        cylinder(d = $Bearing8mmDiameter, h = 15);
    }
  }
}

module BasePlateHoleSet()
{
  translate([7, 10])
   circle(d = $LockScrewBoreM3Laser);
  translate([33, 10])
   circle(d = $LockScrewBoreM3Laser);
} 

module BaseRowHoleSet()
{
  BasePlateHoleSet();
//  translate([0, $YRailLength])
//    BasePlateHoleSet();
  translate([0, $YRailLength - 7])
    BasePlateHoleSet();
}

module BasePlate()
{
  difference()
  {
    square([$XRailLength + 40, $YRailLength + 20]);
    BaseRowHoleSet();
    translate([$XRailLength, 0])
      BaseRowHoleSet();
//    translate([$XRailLength - 10, 0])
//      BaseRowHoleSet();
    translate([20, 10])
      AlignmentBarSet($Type = 1);
    //Y Motor support mounting holes
    translate([($XRailLength + 40 - 48) / 2, $YRailLength - 1.8])
    {
      translate([24, 15])
        circle(d = $LockScrewBoreM3Laser);
      translate([38, 7])
        circle(d = $LockScrewBoreM3Laser);
      translate([10, 7])
        circle(d = $LockScrewBoreM3Laser);
    }
  }
}

module AlignmentHoles()
{
  for ($i = [0:(($Length - 20) / 30)])
  {
    translate([5, ($i * 30) + 10, -1])
      cylinder(d = $LockScrewBoreM2Laser, h = 10);
  }
}

module AlignmentBar()
{
  if ($Type == 0)
  {
    square([10, $Length]);
  }
  else if ($Type == 1)
  {
    for ($i = [0:(($Length - 20) / 30)])
    {
      translate([5, ($i * 30) + 10])
        circle(d = $LockScrewBoreM2Laser);
    }
  }
  else if ($Type == 2)
  {
    for ($i = [0:(($Length - 20) / 30)])
    {
      translate([5, ($i * 30) + 10])
        circle(d = $LockScrewBoreM2Laser + $PlateClearance);
    }
  }
}

module AlignmentBarSet()
{
  //Left
  translate([10, 10])
    AlignmentBar($Length = $YRailLength - 60, $Type = $Type);
  translate([40, 10])
    AlignmentBar($Length = $YRailLength - 60, $Type = $Type);
//  translate([70, 10])
//    AlignmentBar($Length = $YRailLength - 60, $Type = $Type);
  //Right
//  translate([$XRailLength - 20, 10])
//    AlignmentBar($Length = $YRailLength - 60, $Type = $Type);
  translate([$XRailLength - 50, 10])
    AlignmentBar($Length = $YRailLength - 60, $Type = $Type);
  translate([$XRailLength - 80, 10])
    AlignmentBar($Length = $YRailLength - 60, $Type = $Type);
  //Top
//  translate([35, $YRailLength - 5])
//    rotate(-90, [0, 0, 1])
//      AlignmentBar($Length = $YRailLength - 70, $Type = $Type);
  translate([35, $YRailLength - 35])
    rotate(-90, [0, 0, 1])
      AlignmentBar($Length = $YRailLength - 70, $Type = $Type);
  translate([35, $YRailLength - 65])
    rotate(-90, [0, 0, 1])
      AlignmentBar($Length = $YRailLength - 70, $Type = $Type);
}

module AlignmentBars()
{
  difference()
  {
    AlignmentBarSet($Type = 0);
    AlignmentBarSet($Type = 2);
  }
}

module LimitSwitchHoles()
{
  translate([5, 2.5, -10])
    cylinder(d = $LockScrewBoreM2_5Laser, h = 30);
  translate([15, 2.5, -10])
    cylinder(d = $LockScrewBoreM2_5Laser, h = 30);
}

module LimitSwitch()
{
  difference()
  {
    color([0.3, 0.3, 0.3])
    cube([20, 10, 6.6]);
    LimitSwitchHoles();
  }
  color([0.7, 0.7, 0.7])
  translate([0, -1.8, 3.3])
  {
    translate([1.75, 0, 0])
      cube([0.5, 3.6, 3.4], center = true);
    translate([10, 0, 0])
      cube([0.5, 3.6, 3.4], center = true);
    translate([20-1.75, 0, 0])
      cube([0.5, 3.6, 3.4], center = true);
  }
  color([0.7, 0.7, 0.7])
    translate([3, 10, 1.3])
      rotate(10, [0, 0, 1])
        cube([17, .35, 4]);
}

module LeadScrewBearingBlockSupport()
{
  LeadScrewBearingBlock($Depth = 10);
  translate([-20, -5, $HeightAdjust - 105])
    cube([40, 10, 66]);
  difference()
  {
    translate([-30, -5, $HeightAdjust - 105])
      cube([60, 10, 10]);
    translate([25, 0, $HeightAdjust - 105])
      cylinder(d = $LockScrewBoreM3Horizontal + $HorizontalLockClearance, h = 20);
    translate([-25, 0, $HeightAdjust - 105])
      cylinder(d = $LockScrewBoreM3Horizontal + $HorizontalLockClearance, h = 20);
  }
}

module NewLaserCheck()
{
  translate([0, $YPosition, 0])
  {
    translate([$XPosition, 0, 0])
    {
      //Laser sled
      XCarriageFixedDiode();
    }
  }
  //Y carriage cover plate
  translate([-9, $YPosition - 27.5, 29])
    YCoverPlate();
  //X carriage belts
  color([0.1, 0.1, 0.1])
  {
    translate([0, $YPosition + 4.8 + 4.5, 13.4])
      cube([$XRailLength, 1.6, 6.2]);
    translate([0, $YPosition - 4.8 - 1.6 + 4.5, 13.4])
      cube([$XRailLength, 1.6, 6.2]);
  }
  //Belt clamps
  translate([$XPosition - 11.5, $YPosition, 0])
    BeltClamp();
  translate([$XPosition + 30.5, $YPosition, 0])
    BeltClamp();
  //Belt bearing
  translate([0, $YPosition - 1, 13])
    cylinder(d = 22, h = 7);

}

module FocusRing()
{
  difference()
  {
    cylinder(d = 40, h = 4, $fn = 12);
    cylinder(d = 12.4, h = 4, $fn = 40);
  }
}

module FocusRingNozzle()
{
  difference()
  {
    cylinder(d = 40, h = .5, $fn = 12);
    cylinder(d = 14, h = 4, $fn = 40);
  }
    translate([0, 0, .5])
  difference()
  {
    cylinder(d1 = 16, d2 = 7, h = 23, $fn = 40);
    cylinder(d1 = 14, d2 = 3, h = 23, $fn = 40);
  }
}

module DisplayAlignment()
{
  
  translate([0, $YPosition, 0])
  {
    
    //Y side rail carriages
    translate([0, 0, 	$HeightAdjust])
      LeftSideRailCarriage();
    translate([$XRailSpacing, 0, $HeightAdjust])
    {
      RightSideRailCarriage();
      translate([0, 27.5, 28])
        rotate(90, [0, 1, 0])
          rotate(-90, [1, 0, 0])
            LimitSwitch();
    }
    
    //Carrier rails
    translate([0, 0, 	$HeightAdjust])
      color([0.7, 0.7, 0.72])
      {
        translate([-10, -$CarrierSpacing / 2, $CarrierZOffset])
          rotate(90, [0, 1, 0])
            cylinder(d = 6, h = $XRailLength + 20);
        translate([-10, $CarrierSpacing / 2, $CarrierZOffset])
          rotate(90, [0, 1, 0])
            cylinder(d = 6, h = $XRailLength + 20);
      }
      //Laser sled
      translate([$XPosition, 0, $HeightAdjust])
      {
        XCarriageFixedDiode();
      }
    }
    
    //Y slider rails
    translate([0, 0, $HeightAdjust])
      color([0.7, 0.7, 0.72])
      {
        rotate(-90, [1, 0, 0])
          cylinder(d = 6, h = $YRailLength);
        translate([$XRailSpacing, 0, 0])
          rotate(-90, [1, 0, 0])
            cylinder(d = 6, h = $YRailLength);
      }
      
    //Base Y rail clamps
    YRailClamp();
    translate([$XRailLength, 0, 0])
      YRailClamp();
    translate([0, $YRailLength - 7, 0])
      YRailClamp();
    translate([$XRailLength, $YRailLength - 7, 0])
      YRailClamp();

  translate([0, 0, $HeightAdjust])
  {
    //Y travel end plates
    translate([0, -5, 0])
      rotate(90, [1, 0, 0])
        YPlate($ShaftDiameter = 23);
  //  translate([0, 5 + $AcrylicThickness, 0])
  //    rotate(90, [1, 0, 0])
  //      YPlate($ShaftDiameter = 23);
    translate([0, $YRailLength - 12, 0])
      rotate(90, [1, 0, 0])
        YPlate($ShaftDiameter = 23);
  //  translate([0, 5 + $AcrylicThickness + $YRailLength, 0])
  //    rotate(90, [1, 0, 0])
  //      YPlate($ShaftDiameter = 23);
    //Y leadscrew
    color([0.8, 0.8, 0.83])
      translate([$XRailLength / 2, 0, 41])
        rotate(-90, [1, 0, 0])
          cylinder(d = 8, h = $YRailLength);
    //Y leadscrew rider
    translate([$XRailLength / 2, $YPosition, 41])
      LeadScrewRider();
    //Y movement motor
    translate([($XRailLength - 42) / 2, $YRailLength + 7 + $AcrylicThickness, 19.5])
    {
      YMotor();
      YMotorMount();
    }
    //Y carriage cover plate
    translate([-9, $YPosition - 27.5, 29])
      YCoverPlate();
    
    //X carriage stepper
    translate([$XRailLength - 25, $YPosition + 4.5, 29 + $AcrylicThickness])
      XStepper();
      
      
    //X carriage belts
    color([0.1, 0.1, 0.1])
    {
      translate([0, $YPosition + 4.8 + 4.5, 13.4])
        cube([$XRailLength, 1.6, 6.2]);
      translate([0, $YPosition - 4.8 - 1.6 + 4.5, 13.4])
        cube([$XRailLength, 1.6, 6.2]);
    }

    //Belt clamps
    translate([$XPosition - 11.5, $YPosition, 0])
      BeltClamp();
    translate([$XPosition + 30.5, $YPosition, 0])
      BeltClamp();
   
    //Belt bearing
    translate([0, $YPosition - 1, 13])
      cylinder(d = 22, h = 7);
    //Y leadscrew attatch
    translate([$XRailLength / 2, $YPosition, 39.15 + $AcrylicThickness])
      LeadScrewBlock();
    //Leadscrew support block. Note, thinner than the rail supports so that the plates are not parallel, hence stronger.
    translate([$XRailLength / 2, 0, 41])
      LeadScrewBearingBlockSupport();
    
  //  //Motor support block
  //  translate([$XRailLength / 2, $YRailLength, 41])
  //    LeadScrewBearingBlock($Depth = 8);
      //Y travel limit switch
    translate([($XRailLength / 2) + 14, $YRailLength, -6])
      rotate(90, [0, 1, 0])
        rotate(180, [0, 0, 1])
          LimitSwitch();
    //Laser focus ring
    translate([$XPosition-7, $YPosition + 6, -5])
      FocusRing();
  }
  
  //Base plate
  color($BaseAcrylicColor)
    translate([-20, -10, -26 - $BaseAcrylicThickness])
      linear_extrude(height = $BaseAcrylicThickness, center = false, convexity = 10, twist = 0)
        BasePlate();
  //PCB alignment bars
  color($AlignmentAcrylicColor)
    translate([0, 0,  -26.01])
      linear_extrude(height = $AlignmentAcrylicThickness, center = false, convexity = 10, twist = 0)
        AlignmentBars();


}

module HoleChecker()
{
  difference()
  {
    translate([5, -10])
    square([255, 20]);
    for ($i = [10 : 50])
    {
      translate([($i * $i) / 10, 0, 0])
      circle(d = $i / 10);
    }
  }
}

module PrintItems()
{
  
  //Leadscrew attach clamp
  translate([10, 63, 27.5])
    rotate(90, [1, 0, 0])
      rotate(90, [0, 1, 0])
        LeadScrewBlock();

  //Base Y rail clamps : 4x
    translate([5, 100, 26])
      rotate(90, [0, 0, 1])
      YRailClamp();
    translate([16, 100, 26])
      rotate(90, [0, 0, 1])
      YRailClamp();
    translate([16, 122, 26])
      YRailClamp();
    translate([96, 122, 26])
      YRailClamp();
  
  translate([119, 74, 10])
    LeftSideRailCarriage();
  translate([99, 74, 10])
    RightSideRailCarriage();
    
  translate([55, 75, 0])
    rotate(90, [0, 0, 1])
      XCarriageFixedDiode();
  
  //Note, thinner than the rail supports so that the plates are not parallel, hence stronger.
  translate([62, 20, 4])
    rotate(90, [1, 0, 0])
      LeadScrewBearingBlock($Depth = 8);
  translate([20, 20, 4])
    rotate(90, [1, 0, 0])
      LeadScrewBearingBlock($Depth = 8);
      

  translate([105, 128, -5])
    rotate(90, [0, 0, 1])
    rotate(90, [1, 0, 0])
      BeltClamp();
  translate([80, 128, -5])
    rotate(90, [0, 0, 1])
    rotate(90, [1, 0, 0])
      BeltClamp();
   
  translate([88, 41, 22])
    rotate(90, [1, 0, 0])    
      YMotorMount();      
      
  translate([60, 107, 0])
    FocusRing(); 
    
  translate([25, 127, 0])
    YDial();
}

module CalibrationPrint()
{
  //Vertical openings
  difference()
  {
    cube([50, 20, 10]);
    //Vertical locking holes
    translate([5, 5, -1])
      cylinder(d = $LockScrewBoreM2_5Vertical, h = 12, $fn = 50);
    translate([15, 5, -1])
      cylinder(d = $LockScrewBoreM3Vertical, h = 12, $fn = 50);
    translate([27, 10, -1])
      cylinder(d = $LockScrewBoreM8Vertical, h = 12, $fn = 50);
    //Vertical free holes
    translate([5, 15, -1])
      cylinder(d = $LockScrewBoreM2_5Vertical + $VerticalLockClearance, h = 12, $fn = 50);
    translate([15, 15, -1])
      cylinder(d = $LockScrewBoreM3Vertical + $VerticalLockClearance, h = 12, $fn = 50);
    //Leadscrew traveller
    translate([40, 10, -1])
        cylinder(d = $LeadScrewAttachHoleDiameter, h = 20);
  }
  //Horizontal openings
  translate([50, 0, 0])
  difference()
  {
    cube([30, 10, 20]);
    //3MM shaft
    translate([5, 20, 5])
      rotate(90, [1, 0, 0])
        cylinder(d = $Shaft3mmHorizontal * $RoundToHex, h = 70, $fn = 6);
    //M2.5 locking
    translate([15, 20, 5])
      rotate(90, [1, 0, 0])
        cylinder(d = $LockScrewBoreM2_5Horizontal * $RoundToHex, h = 70, $fn = 6);
    //M3 locking
    translate([25, 20, 5])
      rotate(90, [1, 0, 0])
        cylinder(d = $LockScrewBoreM3Horizontal * $RoundToHex, h = 70, $fn = 6);
    //Horizontal free holes
    //M2.5 free
    translate([15, 20, 15])
      rotate(90, [1, 0, 0])
        cylinder(d = ($LockScrewBoreM2_5Horizontal  + $HorizontalLockClearance)* $RoundToHex, h = 70, $fn = 6);
    //M3 free
    translate([25, 20, 15])
      rotate(90, [1, 0, 0])
        cylinder(d = ($LockScrewBoreM3Horizontal + $HorizontalLockClearance) * $RoundToHex, h = 70, $fn = 6);
  }
  //Bearing mount
  translate([89, 5, 10])
    RodClamp(width = 18, height = 20, screwoffset = 0, depth = 10, boreheight = 10, boreradius = ($Bearing6mmDiameter / 2), gapwidth = 0, screwbore = 0, screwstyle = 0, captivestyle = 0, captivebore = 0, captivedepth = 1.5);
  translate([105, 5, 6])
    RodClamp(width = 15, height = 20, screwoffset = 0, depth = 10, boreheight = 6, boreradius = ($Rail6mmDiameter / 2), gapwidth = 0, screwbore = 0, screwstyle = 0, captivestyle = 0, captivebore = 0, captivedepth = 0);
  //Bearing piller
  translate([24, 20, 0])
    cylinder(d = $BearingShaftDiameter + 3, h = 20);
  
  //Bearing/motor block
  translate([0, 20, 0])
  difference()
  {
    cube([30, 30, 10]);
    translate([15, 15, -1])
        cylinder(d = $Bearing8mmDiameter, h = 15);
  }
  
}

module AlignmentBarPiece()
{
  difference()
  {
    AlignmentBar($Length = $YRailLength - 60, $Type = 0);  
    AlignmentBar($Length = $YRailLength - 60, $Type = 2);  
  }
}

module LaserSet1()
{
  //Set 1
  BasePlate();
}

module LaserSet2()
{
  //Set 2
  translate([0, 0])
    YCoverPlate2D();
  translate([9, 73])
    YPlate2D($ShaftDiameter = 23);
  translate([9, 123])
    YPlate2D($ShaftDiameter = 23);
  translate([9, 173])
    YPlate2D($ShaftDiameter = 23);
  translate([9, 223])
    YPlate2D($ShaftDiameter = 23);
}

module LaserSet3()
{
  //Set 3
  translate([0, 0])
    AlignmentBarPiece();
  translate([11, 0])
    AlignmentBarPiece();
  translate([22, 0])
    AlignmentBarPiece();
}

module LaserAll()
{
  LaserSet1();
  translate([350, 0])
    LaserSet2();
  translate([670, 0])
    LaserSet3();  
}

module PrintNewBits()
{
XCarriageFixedDiode();

translate([60, -7, 0])
  rotate(180, [0, 0, 1])
    translate([30, 0, 5])
      rotate(90, [1, 0, 0])
	    YRailClampTall();

translate([-27, 4, 0])
  rotate(180, [0, 0, 1])
    translate([30, 0, 5])
      rotate(90, [1, 0, 0])
	    YRailClampTall();

translate([-20, 10, 0])
  rotate(90, [0, 0, 1])
    translate([30, 0, 5])
      rotate(90, [1, 0, 0])
	    YRailClampTall();

translate([-20, 10, 0])
  rotate(90, [0, 0, 1])
    translate([30, 0, 5])
      rotate(90, [1, 0, 0])
	    YRailClampTall();

translate([-20, -70, 0])
  rotate(90, [0, 0, 1])
    translate([30, 0, 5])
      rotate(90, [1, 0, 0])
	    YRailClampTall();


}

module LaserFocusTest()
{
	difference()
	{
		cube([18, 18, 45], center = true);
		cylinder(d = 12.5, h = 48, center = true);
  }
}

module YDial()
{
  translate([0, 0, 1.5])
  difference()
  {
    union()
    {
      minkowski()
      {
        cylinder(d = 35, h = 12, $fn = 40);
        sphere(d = 3);
      }
      cylinder(d = 15, $fn = 40, h = 22);
    }
    translate([0, 0, 2])
      cylinder(d = 8.3, h = 25);
    translate([0, 0, 18])
      rotate(90, [1, 0, 0])
        cylinder(d = LockScrewBoreM2_5Horizontal, h = 20);
  }
}

/////////////////////////////////////////////////////////////////////////

//PrintItems();

//LaserAll(); 
//LaserSet3(); 

//DisplayAlignment();

//HoleChecker();

//CalibrationPrint();

//NewLaserCheck();

//PrintNewBits();

//XCarriageFixedDiode();

//LaserFocusTest();

//BasePlate();

//translate([-25, -10, 5])
//  rotate(90, [1, 0, 0])
//    LeadScrewBearingBlockSupport();

//translate([0, 0, 22])
//rotate(90, [1, 0, 0])
//  YMotorMount();

//FocusRing();
FocusRingNozzle();
  

  
  
